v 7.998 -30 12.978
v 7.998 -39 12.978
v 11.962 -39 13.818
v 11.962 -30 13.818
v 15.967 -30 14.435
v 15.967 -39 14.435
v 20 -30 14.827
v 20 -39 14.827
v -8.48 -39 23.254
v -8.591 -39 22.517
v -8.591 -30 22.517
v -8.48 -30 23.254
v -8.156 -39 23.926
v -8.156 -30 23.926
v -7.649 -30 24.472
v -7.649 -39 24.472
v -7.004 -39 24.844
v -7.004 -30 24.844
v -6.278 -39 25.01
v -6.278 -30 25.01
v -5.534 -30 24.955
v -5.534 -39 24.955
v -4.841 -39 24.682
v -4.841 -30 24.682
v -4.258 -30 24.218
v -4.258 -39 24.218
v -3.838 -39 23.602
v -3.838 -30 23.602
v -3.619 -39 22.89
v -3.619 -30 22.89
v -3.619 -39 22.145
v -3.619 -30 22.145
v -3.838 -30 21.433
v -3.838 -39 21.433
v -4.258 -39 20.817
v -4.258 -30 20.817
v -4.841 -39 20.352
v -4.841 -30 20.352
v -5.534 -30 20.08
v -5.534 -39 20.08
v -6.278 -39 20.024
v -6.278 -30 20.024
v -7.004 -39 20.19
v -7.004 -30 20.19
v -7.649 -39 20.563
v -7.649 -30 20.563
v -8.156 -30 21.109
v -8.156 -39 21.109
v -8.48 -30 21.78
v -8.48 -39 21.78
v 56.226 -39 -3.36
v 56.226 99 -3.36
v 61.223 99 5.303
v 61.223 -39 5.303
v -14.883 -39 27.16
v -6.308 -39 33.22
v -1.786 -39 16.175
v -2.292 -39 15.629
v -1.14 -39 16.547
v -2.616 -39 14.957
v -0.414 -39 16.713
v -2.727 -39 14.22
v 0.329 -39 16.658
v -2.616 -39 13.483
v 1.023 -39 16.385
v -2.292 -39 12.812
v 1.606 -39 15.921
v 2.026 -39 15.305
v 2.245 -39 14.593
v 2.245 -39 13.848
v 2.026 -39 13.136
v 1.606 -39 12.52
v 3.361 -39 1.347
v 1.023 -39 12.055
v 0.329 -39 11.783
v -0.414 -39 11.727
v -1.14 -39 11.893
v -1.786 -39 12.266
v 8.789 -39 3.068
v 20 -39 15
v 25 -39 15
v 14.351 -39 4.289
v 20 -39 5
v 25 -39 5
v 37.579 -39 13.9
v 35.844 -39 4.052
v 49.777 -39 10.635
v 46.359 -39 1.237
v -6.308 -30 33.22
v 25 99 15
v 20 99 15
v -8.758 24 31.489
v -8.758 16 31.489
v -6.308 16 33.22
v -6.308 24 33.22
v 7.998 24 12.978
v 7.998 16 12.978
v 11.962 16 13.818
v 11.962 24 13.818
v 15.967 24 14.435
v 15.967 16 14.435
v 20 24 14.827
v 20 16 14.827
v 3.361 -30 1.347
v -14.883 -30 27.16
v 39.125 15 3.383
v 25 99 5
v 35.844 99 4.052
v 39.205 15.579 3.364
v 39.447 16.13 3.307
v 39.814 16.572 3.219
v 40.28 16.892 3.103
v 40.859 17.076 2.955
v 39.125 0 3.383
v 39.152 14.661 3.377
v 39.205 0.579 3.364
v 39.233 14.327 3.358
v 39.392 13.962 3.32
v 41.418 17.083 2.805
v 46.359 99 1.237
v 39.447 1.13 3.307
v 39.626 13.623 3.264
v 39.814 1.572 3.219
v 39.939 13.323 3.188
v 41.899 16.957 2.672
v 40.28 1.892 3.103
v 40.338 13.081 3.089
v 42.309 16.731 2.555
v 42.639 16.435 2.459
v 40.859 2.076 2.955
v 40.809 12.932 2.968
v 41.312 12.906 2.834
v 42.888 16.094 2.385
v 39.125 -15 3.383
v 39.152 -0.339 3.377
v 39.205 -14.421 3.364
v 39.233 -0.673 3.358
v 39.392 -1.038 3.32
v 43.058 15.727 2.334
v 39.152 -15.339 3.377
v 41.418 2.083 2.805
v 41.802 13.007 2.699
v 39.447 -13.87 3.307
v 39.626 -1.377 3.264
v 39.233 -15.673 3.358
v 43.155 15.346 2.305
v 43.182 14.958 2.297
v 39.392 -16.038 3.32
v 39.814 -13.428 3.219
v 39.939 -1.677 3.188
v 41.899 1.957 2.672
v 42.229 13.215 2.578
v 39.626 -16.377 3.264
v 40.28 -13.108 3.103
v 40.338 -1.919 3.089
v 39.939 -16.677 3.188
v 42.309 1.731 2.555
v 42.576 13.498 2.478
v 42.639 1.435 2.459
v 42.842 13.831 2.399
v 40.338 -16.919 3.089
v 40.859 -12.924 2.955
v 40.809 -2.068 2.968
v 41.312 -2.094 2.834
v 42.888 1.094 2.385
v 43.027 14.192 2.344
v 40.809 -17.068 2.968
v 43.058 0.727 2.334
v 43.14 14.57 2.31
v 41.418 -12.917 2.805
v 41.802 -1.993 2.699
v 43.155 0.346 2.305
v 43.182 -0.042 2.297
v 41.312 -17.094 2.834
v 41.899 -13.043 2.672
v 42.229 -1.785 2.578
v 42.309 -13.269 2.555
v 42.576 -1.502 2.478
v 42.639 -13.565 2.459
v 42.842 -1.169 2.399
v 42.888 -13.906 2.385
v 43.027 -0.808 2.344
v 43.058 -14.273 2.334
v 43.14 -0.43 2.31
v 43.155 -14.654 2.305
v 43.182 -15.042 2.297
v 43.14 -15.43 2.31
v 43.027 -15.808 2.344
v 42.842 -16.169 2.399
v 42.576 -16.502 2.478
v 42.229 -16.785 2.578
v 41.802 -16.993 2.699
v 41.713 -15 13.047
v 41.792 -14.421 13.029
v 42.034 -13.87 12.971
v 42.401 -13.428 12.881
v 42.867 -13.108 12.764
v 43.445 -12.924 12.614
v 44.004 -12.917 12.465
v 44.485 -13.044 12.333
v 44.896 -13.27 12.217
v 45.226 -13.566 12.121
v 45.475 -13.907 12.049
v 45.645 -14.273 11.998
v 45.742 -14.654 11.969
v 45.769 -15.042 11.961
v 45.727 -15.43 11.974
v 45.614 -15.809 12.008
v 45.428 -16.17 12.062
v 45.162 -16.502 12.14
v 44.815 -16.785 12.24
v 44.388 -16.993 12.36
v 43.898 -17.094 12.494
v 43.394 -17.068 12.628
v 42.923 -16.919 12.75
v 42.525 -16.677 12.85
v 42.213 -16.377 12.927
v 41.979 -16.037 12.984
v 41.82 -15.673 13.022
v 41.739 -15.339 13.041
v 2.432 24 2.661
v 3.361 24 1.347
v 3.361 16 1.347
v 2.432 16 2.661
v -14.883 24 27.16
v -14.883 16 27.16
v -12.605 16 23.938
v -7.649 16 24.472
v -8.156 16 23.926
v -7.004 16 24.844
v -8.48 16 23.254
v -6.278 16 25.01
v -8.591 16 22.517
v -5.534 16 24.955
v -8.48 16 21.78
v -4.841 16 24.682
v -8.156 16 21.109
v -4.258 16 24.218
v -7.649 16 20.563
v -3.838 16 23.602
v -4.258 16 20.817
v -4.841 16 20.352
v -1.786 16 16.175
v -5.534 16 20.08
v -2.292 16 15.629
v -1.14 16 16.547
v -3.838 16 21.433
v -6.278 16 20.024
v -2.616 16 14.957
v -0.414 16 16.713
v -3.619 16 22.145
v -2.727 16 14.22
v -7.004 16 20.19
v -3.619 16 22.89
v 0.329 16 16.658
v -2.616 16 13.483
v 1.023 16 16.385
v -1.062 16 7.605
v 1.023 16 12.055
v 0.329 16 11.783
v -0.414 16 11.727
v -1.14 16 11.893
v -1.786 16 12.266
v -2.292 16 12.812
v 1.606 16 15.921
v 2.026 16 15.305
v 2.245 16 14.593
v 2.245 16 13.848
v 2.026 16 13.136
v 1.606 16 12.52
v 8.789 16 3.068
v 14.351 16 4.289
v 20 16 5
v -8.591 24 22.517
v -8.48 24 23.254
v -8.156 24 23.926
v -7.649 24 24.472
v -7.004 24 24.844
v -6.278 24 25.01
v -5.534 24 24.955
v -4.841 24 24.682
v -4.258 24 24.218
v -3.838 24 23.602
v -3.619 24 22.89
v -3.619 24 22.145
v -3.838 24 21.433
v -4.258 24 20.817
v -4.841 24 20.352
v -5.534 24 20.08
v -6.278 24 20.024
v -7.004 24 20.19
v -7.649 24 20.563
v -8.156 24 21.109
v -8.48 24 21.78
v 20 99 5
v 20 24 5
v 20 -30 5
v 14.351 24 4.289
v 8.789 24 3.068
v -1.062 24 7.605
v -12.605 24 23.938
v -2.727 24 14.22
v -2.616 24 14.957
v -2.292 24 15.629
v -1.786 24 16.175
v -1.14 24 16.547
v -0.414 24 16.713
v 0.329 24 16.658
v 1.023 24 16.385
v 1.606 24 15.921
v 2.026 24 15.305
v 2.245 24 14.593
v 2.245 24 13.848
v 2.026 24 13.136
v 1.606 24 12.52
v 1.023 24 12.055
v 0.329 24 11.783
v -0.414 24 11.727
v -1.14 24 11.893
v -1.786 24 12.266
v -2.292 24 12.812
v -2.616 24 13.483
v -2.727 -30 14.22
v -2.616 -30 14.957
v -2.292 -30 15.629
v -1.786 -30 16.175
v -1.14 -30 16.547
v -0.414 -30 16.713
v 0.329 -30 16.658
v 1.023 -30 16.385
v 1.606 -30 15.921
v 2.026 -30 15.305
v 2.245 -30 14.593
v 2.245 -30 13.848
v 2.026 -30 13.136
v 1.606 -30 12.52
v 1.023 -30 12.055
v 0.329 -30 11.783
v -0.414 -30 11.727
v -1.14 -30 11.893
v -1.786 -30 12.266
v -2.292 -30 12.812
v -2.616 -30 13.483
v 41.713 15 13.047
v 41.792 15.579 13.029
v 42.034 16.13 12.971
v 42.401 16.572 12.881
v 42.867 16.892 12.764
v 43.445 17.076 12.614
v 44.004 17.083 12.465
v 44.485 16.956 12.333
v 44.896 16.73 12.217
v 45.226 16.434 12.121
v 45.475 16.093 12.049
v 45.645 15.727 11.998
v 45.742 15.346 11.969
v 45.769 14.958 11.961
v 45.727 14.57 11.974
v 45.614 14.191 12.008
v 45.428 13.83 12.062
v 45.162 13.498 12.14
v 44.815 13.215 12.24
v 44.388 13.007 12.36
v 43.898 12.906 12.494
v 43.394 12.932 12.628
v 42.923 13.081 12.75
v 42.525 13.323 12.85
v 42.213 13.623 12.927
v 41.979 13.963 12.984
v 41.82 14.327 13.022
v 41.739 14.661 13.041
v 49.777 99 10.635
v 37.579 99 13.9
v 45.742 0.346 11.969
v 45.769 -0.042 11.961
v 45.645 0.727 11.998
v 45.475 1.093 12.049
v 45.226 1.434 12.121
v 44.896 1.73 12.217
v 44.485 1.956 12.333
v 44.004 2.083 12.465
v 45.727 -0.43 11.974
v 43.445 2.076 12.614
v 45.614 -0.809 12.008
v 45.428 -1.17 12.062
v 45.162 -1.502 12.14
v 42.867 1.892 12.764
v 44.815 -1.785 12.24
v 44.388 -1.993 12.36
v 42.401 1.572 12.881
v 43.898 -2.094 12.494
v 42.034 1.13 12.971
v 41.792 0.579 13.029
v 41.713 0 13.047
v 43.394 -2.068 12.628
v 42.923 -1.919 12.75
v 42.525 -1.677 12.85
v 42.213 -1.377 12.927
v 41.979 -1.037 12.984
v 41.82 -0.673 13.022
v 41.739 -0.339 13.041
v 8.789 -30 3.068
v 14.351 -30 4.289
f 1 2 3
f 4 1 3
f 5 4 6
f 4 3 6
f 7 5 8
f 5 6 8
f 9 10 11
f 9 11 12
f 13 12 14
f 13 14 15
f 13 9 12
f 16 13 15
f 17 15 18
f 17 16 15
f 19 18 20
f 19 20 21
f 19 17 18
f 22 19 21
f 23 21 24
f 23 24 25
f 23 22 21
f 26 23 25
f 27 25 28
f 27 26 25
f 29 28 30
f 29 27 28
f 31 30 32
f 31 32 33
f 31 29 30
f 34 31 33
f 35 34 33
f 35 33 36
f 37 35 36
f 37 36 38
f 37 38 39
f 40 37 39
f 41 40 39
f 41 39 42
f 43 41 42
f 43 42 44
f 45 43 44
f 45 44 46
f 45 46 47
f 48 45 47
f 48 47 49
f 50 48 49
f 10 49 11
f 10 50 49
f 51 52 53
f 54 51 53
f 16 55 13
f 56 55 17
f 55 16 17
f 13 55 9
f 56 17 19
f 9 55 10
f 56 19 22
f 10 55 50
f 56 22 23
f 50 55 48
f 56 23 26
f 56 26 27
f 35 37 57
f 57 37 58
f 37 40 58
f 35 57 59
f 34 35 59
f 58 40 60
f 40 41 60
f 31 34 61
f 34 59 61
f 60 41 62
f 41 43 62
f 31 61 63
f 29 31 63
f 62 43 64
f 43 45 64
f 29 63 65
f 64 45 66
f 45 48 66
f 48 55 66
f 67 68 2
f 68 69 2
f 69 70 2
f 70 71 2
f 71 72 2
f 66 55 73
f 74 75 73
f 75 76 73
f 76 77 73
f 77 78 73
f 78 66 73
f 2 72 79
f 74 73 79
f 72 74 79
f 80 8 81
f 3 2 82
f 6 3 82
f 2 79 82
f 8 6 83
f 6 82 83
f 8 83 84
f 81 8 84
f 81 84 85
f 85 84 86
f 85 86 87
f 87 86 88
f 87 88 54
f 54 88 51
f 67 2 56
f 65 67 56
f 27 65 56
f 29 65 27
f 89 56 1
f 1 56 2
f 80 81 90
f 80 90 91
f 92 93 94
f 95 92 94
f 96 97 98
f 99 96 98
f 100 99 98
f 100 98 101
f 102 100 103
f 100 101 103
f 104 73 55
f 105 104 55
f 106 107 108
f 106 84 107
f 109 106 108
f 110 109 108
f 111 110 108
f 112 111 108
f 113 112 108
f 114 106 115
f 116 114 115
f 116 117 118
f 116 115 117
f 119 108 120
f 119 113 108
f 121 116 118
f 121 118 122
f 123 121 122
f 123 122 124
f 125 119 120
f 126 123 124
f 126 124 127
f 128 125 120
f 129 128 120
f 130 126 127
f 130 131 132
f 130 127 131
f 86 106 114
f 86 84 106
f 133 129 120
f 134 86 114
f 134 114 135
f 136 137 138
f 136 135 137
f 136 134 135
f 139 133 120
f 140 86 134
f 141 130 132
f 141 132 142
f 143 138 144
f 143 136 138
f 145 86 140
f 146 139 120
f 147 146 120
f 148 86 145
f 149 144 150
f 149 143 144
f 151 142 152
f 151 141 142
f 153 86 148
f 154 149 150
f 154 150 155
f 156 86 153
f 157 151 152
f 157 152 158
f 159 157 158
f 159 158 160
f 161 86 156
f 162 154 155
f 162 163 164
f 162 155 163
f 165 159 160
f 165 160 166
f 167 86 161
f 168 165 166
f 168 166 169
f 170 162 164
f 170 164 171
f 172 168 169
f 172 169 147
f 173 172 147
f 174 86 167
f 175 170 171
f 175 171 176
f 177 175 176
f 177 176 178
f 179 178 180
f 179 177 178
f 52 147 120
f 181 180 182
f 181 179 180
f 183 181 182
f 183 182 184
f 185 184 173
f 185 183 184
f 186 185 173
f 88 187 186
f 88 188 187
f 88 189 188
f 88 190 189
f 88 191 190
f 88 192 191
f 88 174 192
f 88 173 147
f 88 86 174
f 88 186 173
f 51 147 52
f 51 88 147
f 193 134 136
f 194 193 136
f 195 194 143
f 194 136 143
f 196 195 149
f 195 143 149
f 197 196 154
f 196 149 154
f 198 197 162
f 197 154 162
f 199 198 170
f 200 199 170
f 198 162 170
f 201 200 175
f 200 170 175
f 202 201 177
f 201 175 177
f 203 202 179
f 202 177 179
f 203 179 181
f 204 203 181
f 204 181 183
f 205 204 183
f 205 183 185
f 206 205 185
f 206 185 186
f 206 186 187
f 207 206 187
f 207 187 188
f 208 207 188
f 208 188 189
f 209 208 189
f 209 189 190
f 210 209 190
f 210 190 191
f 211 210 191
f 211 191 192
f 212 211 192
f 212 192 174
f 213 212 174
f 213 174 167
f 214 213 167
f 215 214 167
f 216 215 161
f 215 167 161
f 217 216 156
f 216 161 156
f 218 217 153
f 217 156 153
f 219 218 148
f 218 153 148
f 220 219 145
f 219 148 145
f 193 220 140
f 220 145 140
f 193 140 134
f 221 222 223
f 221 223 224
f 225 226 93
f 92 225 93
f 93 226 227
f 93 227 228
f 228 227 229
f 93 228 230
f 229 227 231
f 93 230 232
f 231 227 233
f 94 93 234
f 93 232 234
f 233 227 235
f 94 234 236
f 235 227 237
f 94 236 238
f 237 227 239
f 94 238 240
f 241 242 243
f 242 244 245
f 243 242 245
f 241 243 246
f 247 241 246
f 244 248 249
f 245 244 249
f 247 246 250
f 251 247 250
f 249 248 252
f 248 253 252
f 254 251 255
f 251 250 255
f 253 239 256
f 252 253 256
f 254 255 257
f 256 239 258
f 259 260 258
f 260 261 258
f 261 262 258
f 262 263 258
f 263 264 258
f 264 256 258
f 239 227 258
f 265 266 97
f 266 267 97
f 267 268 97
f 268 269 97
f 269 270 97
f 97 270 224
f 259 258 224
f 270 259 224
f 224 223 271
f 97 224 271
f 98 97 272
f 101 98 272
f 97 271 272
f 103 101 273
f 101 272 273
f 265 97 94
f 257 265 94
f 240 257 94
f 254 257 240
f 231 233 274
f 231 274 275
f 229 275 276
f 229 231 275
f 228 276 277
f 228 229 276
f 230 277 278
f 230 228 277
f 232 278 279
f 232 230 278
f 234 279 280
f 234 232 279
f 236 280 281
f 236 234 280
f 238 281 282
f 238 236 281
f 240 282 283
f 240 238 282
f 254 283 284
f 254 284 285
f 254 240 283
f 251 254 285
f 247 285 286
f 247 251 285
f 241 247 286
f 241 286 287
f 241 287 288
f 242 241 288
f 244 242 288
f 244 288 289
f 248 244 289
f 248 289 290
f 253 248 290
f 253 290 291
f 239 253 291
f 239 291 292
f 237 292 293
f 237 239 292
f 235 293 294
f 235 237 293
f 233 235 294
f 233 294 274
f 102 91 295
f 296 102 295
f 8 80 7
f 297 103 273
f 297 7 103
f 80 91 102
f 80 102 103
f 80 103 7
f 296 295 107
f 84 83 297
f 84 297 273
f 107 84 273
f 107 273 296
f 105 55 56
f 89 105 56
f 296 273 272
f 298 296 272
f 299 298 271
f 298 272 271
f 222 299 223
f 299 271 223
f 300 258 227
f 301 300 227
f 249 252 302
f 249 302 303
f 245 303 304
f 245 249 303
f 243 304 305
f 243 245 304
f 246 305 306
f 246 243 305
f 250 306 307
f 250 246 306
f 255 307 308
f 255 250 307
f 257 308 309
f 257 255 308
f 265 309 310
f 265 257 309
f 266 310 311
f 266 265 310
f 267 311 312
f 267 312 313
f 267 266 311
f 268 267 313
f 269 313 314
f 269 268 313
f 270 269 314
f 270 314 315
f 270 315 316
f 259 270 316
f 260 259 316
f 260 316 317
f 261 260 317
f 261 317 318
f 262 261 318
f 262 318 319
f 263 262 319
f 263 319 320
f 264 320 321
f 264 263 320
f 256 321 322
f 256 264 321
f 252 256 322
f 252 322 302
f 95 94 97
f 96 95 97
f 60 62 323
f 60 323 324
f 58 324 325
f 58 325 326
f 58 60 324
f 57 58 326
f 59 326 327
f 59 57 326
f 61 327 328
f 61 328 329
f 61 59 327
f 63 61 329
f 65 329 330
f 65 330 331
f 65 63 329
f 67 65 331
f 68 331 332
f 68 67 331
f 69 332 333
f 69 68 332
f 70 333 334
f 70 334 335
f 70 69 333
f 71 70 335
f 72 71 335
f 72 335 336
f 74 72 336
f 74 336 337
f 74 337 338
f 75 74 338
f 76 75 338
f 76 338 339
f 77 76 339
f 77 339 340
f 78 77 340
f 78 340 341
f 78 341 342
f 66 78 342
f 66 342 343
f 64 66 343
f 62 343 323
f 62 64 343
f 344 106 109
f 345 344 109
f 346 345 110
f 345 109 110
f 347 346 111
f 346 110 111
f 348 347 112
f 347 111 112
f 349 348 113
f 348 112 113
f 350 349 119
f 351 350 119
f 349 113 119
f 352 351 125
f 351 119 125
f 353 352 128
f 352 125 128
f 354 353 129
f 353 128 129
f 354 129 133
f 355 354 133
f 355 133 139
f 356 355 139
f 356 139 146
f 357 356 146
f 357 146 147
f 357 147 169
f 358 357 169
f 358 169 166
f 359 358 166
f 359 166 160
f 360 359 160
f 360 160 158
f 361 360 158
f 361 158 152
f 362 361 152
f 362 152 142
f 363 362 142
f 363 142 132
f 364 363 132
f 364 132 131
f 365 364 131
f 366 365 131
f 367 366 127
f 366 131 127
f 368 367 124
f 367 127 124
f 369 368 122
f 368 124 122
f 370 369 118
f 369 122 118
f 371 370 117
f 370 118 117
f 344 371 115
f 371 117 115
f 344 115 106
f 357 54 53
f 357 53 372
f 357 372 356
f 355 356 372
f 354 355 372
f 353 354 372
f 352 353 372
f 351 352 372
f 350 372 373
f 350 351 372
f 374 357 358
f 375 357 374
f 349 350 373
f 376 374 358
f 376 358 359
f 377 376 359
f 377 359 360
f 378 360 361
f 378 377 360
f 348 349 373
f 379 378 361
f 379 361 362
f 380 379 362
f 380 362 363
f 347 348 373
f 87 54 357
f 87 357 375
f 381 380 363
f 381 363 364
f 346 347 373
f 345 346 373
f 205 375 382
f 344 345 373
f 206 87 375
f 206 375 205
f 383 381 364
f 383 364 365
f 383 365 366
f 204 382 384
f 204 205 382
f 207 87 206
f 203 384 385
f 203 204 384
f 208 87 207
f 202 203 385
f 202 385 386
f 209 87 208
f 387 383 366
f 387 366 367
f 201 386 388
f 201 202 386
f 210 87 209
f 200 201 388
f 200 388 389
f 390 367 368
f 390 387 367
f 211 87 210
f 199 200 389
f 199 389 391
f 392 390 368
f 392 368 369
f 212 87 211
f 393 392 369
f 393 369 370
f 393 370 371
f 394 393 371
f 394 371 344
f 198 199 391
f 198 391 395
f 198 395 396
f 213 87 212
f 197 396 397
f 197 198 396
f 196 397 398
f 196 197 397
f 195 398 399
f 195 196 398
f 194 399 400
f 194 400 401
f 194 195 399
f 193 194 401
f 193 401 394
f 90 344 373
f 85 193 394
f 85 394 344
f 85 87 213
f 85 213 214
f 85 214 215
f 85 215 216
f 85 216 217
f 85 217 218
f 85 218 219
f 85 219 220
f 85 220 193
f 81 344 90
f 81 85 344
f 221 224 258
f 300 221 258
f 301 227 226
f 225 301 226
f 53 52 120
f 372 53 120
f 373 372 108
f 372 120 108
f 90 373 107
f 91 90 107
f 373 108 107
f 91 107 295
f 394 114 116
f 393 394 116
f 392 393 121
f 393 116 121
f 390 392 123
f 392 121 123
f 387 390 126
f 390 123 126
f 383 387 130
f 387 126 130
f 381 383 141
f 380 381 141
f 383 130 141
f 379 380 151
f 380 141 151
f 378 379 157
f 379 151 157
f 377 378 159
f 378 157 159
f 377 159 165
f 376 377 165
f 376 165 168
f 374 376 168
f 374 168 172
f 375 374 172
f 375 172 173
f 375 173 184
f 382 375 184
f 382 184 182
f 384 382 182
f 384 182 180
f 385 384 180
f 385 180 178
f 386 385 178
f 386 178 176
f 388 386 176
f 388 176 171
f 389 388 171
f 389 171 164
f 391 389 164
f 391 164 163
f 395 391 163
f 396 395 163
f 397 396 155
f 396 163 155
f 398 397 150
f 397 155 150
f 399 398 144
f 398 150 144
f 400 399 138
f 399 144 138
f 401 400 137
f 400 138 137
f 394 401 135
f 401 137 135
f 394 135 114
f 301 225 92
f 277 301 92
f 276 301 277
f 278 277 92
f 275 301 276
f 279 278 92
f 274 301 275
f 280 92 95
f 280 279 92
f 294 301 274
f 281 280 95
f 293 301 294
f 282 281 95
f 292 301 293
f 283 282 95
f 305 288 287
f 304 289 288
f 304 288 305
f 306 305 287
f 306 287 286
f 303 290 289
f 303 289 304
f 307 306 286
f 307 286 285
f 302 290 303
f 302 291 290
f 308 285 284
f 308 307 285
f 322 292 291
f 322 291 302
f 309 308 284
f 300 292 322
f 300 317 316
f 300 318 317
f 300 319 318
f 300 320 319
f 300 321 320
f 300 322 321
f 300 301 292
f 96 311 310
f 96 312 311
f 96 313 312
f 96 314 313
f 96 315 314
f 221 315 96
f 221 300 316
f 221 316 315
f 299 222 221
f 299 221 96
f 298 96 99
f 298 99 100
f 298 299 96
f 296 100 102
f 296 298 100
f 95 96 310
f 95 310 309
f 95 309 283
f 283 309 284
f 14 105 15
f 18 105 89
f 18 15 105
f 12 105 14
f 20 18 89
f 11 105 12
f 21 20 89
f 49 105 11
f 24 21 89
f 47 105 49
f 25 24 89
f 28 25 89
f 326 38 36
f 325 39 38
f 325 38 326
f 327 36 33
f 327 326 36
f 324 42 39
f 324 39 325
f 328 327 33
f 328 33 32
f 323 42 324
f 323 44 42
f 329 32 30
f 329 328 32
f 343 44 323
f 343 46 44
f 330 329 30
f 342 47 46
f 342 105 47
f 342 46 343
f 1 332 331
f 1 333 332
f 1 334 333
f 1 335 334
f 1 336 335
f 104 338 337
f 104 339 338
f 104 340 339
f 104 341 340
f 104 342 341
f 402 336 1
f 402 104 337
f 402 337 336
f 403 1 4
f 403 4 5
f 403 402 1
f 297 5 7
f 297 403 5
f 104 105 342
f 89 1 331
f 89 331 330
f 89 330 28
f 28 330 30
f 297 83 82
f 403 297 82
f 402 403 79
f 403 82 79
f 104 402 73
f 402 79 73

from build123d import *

# Parameters (mm, degrees)
BOSS_EXTRUDE2_DEPTH = 20
FILLET1_RADIUS      = 10
FILLET1_LENGTH      = 5
FILLET2_RADIUS      = 10
FILLET2_LENGTH      = 5
SKETCH5_R           = 1
SKETCH5_R_2         = 5.5
CUT_EXTRUDE5_DEPTH  = 69.007352544
CUT_EXTRUDE7_DEPTH  = 25
FILLET5_R           = 10
BOSS_EXTRUDE5_DEPTH = 60
SKETCH13_R          = 2.1
CUT_EXTRUDE8_DEPTH  = 60
CUT_EXTRUDE9_DEPTH  = 60
CUT_EXTRUDE10_DEPTH = 60
SKETCH17_R          = 2.5
BOSS_EXTRUDE6_DEPTH = 8
SKETCH18_R          = 2.5
BOSS_EXTRUDE7_DEPTH = 9
BOSS_EXTRUDE8_DEPTH = 69


with BuildPart() as part:
    # Sketch1 → Boss-Extrude2 (new body)
    with BuildSketch(Plane.XY):
        Polygon((-25, 30), (25, 30), (25, -30), (-25, -30), (-25, -25), (-20, -25), (20, -25), (20, 25), (-20, 25), (-25, 25), align=None)
    extrude(amount=BOSS_EXTRUDE2_DEPTH)

    # Fillet1: full round fillet: the end face becomes a half cylinder, R = half its width
    fillet1_face = Plane((-25, 27.5, 10), x_dir=(0, -1, 0), z_dir=(-1, 0, 0))  # on the end face: x along it, z out of the body
    fillet1_slab = fillet1_face.offset(-FILLET1_RADIUS / 2) * Box(FILLET1_LENGTH, 2 * FILLET1_RADIUS, FILLET1_RADIUS, mode=Mode.PRIVATE)  # the body's end, R deep
    fillet1_round = Plane((-15, 27.5, 10), x_dir=(-1, 0, 0), z_dir=(0, -1, 0)) * Cylinder(FILLET1_RADIUS, FILLET1_LENGTH, mode=Mode.PRIVATE)  # its axis R under the face
    add(fillet1_slab - fillet1_round, mode=Mode.SUBTRACT)

    # Fillet2: full round fillet: the end face becomes a half cylinder, R = half its width
    fillet2_face = Plane((-25, -27.5, 10), x_dir=(0, -1, 0), z_dir=(-1, 0, 0))  # on the end face: x along it, z out of the body
    fillet2_slab = fillet2_face.offset(-FILLET2_RADIUS / 2) * Box(FILLET2_LENGTH, 2 * FILLET2_RADIUS, FILLET2_RADIUS, mode=Mode.PRIVATE)  # the body's end, R deep
    fillet2_round = Plane((-15, -27.5, 10), x_dir=(-1, 0, 0), z_dir=(0, -1, 0)) * Cylinder(FILLET2_RADIUS, FILLET2_LENGTH, mode=Mode.PRIVATE)  # its axis R under the face
    add(fillet2_slab - fillet2_round, mode=Mode.SUBTRACT)

    # Sketch5 → Cut-Extrude5 (cut, through all)
    with BuildSketch(Plane(origin=(0, 30, 0), x_dir=(1, 0, 0), z_dir=(0, 1, 0))):
        with Locations(Location((-15, -3, 0), (0, 0, 180))):
            Circle(SKETCH5_R)
        with Locations(Location((-22, -10, 0), (0, 0, 180))):
            Circle(SKETCH5_R)
        with Locations(Location((-15, -17, 0), (0, 0, 180))):
            Circle(SKETCH5_R)
        with Locations(Location((-8, -10, 0), (0, 0, 180))):
            Circle(SKETCH5_R)
        with Locations(Location((-15, -10, 0), (0, 0, 180))):
            Circle(SKETCH5_R_2)
    extrude(amount=-CUT_EXTRUDE5_DEPTH, mode=Mode.SUBTRACT)

    # Sketch10 → Cut-Extrude7 (cut)
    with BuildSketch(Plane(origin=(25, 0, 0), x_dir=(0, 0, -1), z_dir=(1, 0, 0))):
        Polygon((-15, 28.180148829), (-15, -28.180148829), (-15, -30), (-20, -30), (-20, 30), (-15, 30), align=None)
        Polygon((-5, 28.180148829), (-5, -28.180148829), (-5, -30), (0, -30), (0, 30), (-5, 30), align=None)
    extrude(amount=-CUT_EXTRUDE7_DEPTH, mode=Mode.SUBTRACT)

    # Fillet5
    # the kernel refuses this fillet: 10 mm, written as the material it adds along each edge
    with BuildSketch(Plane(origin=(0, 25, 15), x_dir=(1, 0, 0), z_dir=(0, 1, 0)), Plane(origin=(0, -30, 15), x_dir=(1, 0, 0), z_dir=(0, 1, 0)), Plane(origin=(0, -25, 5), x_dir=(1, 0, 0), z_dir=(0, -1, 0))) as fillet5_piece_1:
        with BuildLine():
            CenterArc((8.660254038, -10), FILLET5_R, 90, 60)
            Line((0, -5), (-0.173205081, -4.9))
            ThreePointArc((-0.173205081, -4.9), (-0.2, -2.5), (-0.2, 0))
            Line((-0.2, 0), (0, 0.2))
            Line((0, 0.2), (8.660254038, 0.2))
            Line((8.660254038, 0.2), (8.660254038, 0))
        make_face()
    extrude(amount=5)
    with BuildSketch(Plane(origin=(0, 30, 5), x_dir=(0, 0, -1), z_dir=(0, -1, 0))) as fillet5_piece_2:
        with BuildLine():
            CenterArc((10, 8.660254038), FILLET5_R, 180, 60)
            Line((0, 8.660254038), (-0.2, 8.660254038))
            Line((-0.2, 8.660254038), (-0.2, 0))
            Line((-0.2, 0), (0, -0.2))
            ThreePointArc((0, -0.2), (2.5, -0.2), (4.9, -0.173205081))
            Line((4.9, -0.173205081), (5, 0))
        make_face()
    extrude(amount=5)

    # Sketch12 → Boss-Extrude5 (add)
    with BuildSketch(Plane.XZ.offset(30)):
        with BuildLine():
            Line((56.226298398, -3.359735054), (61.222506141, 5.302707337))
            ThreePointArc((61.222506141, 5.302707337), (43.74904955, 12.533728595), (25, 15))
            Line((25, 15), (25, 5))
            ThreePointArc((25, 5), (41.16297375, 2.873903962), (56.226298398, -3.359735054))
        make_face()
    extrude(amount=-BOSS_EXTRUDE5_DEPTH)

    # Sketch13 → Cut-Extrude8 (cut)
    with BuildSketch(Plane(origin=(2.920998947, 0, 10.910870277), x_dir=(-0.9659824633840055, 0, 0.2586075800021504), z_dir=(-0.2586075800021504, 0, -0.9659824633840055))):
        with Locations((-39.019497435, 15)):
            Circle(SKETCH13_R)
        with Locations((-39.019497435, 0)):
            Circle(SKETCH13_R)
        with Locations((-39.019497435, -15)):
            Circle(SKETCH13_R)
    extrude(amount=-CUT_EXTRUDE8_DEPTH, mode=Mode.SUBTRACT)

    # Sketch15 → Cut-Extrude9 (cut)
    with BuildSketch(Plane(origin=(0, 30, 0), x_dir=(1, 0, 0), z_dir=(0, 1, 0))):
        with BuildLine():
            Line((8.660254038, -5), (8.660254038, -15))
            ThreePointArc((8.660254038, -15), (-39.182795974, -10), (8.660254038, -5))
        make_face()
    extrude(amount=-CUT_EXTRUDE9_DEPTH, mode=Mode.SUBTRACT)

    # Sketch16 → Cut-Extrude10 (cut)
    with BuildSketch(Plane(origin=(0, 30, 0), x_dir=(1, 0, 0), z_dir=(0, 1, 0))):
        Polygon((-6.307906019, -33.220384693), (8.660254038, -15), (20.000254038, -15), (20.000254038, -5), (8.660254038, -5), (3.496355525, -1.350438774), (-14.790578774, -27.225295226), align=None)
    extrude(amount=-CUT_EXTRUDE10_DEPTH, mode=Mode.SUBTRACT)

    # Sketch17 → Boss-Extrude6 (add)
    # profile 1 of 2: a face of its own
    with BuildSketch(Plane(origin=(0, 16, 0), x_dir=(1, 0, 0), z_dir=(0, 1, 0))):
        Polygon((2.432023453, -2.661202229), (-1.062108246, -7.605177784), (-12.605177784, -23.937891754), (-14.882580853, -27.160273185), (-8.757813114, -31.488924262), (-6.307906019, -33.220384693), (7.998117102, -12.978265997), (11.006698288, -8.721313737), align=None)
        with Locations(Location((-6.090722034, -22.517234763, 0), (0, 0, 180))):
            Circle(SKETCH17_R, mode=Mode.SUBTRACT)
        with Locations(Location((-0.226842709, -14.220216066, 0), (0, 0, 180))):
            Circle(SKETCH17_R, mode=Mode.SUBTRACT)
    # profile 2 of 2: a face of its own
    with BuildSketch(Plane(origin=(0, 16, 0), x_dir=(1, 0, 0), z_dir=(0, 1, 0))):
        with BuildLine():
            Line((3.360713643, -1.347164296), (2.432023453, -2.661202229))
            Line((2.432023453, -2.661202229), (11.006698288, -8.721313737))
            Line((11.006698288, -8.721313737), (7.998117102, -12.978265997))
            ThreePointArc((7.998117102, -12.978265997), (13.960401245, -14.154569005), (20.000254038, -14.827398269))
            Line((20.000254038, -14.827398269), (20.000254038, -5))
            ThreePointArc((20.000254038, -5), (11.555844657, -3.741343444), (3.360713643, -1.347164296))
        make_face()
    extrude(amount=BOSS_EXTRUDE6_DEPTH)

    # Sketch18 → Boss-Extrude7 (add)
    with BuildSketch(Plane(origin=(0, -39, 0), x_dir=(1, 0, 0), z_dir=(0, 1, 0))):
        with BuildLine():
            Line((3.360713643, -1.347164296), (-14.882580853, -27.160273185))
            Line((-14.882580853, -27.160273185), (-6.307906019, -33.220384693))
            Line((-6.307906019, -33.220384693), (7.998117102, -12.978265997))
            ThreePointArc((7.998117102, -12.978265997), (13.960401245, -14.154569005), (20.000254038, -14.827398269))
            Line((20.000254038, -14.827398269), (20.000254038, -15))
            Line((20.000254038, -15), (25, -15))
            ThreePointArc((25, -15), (43.74904955, -12.533728595), (61.222506141, -5.302707337))
            Line((61.222506141, -5.302707337), (56.226298398, 3.359735054))
            ThreePointArc((56.226298398, 3.359735054), (41.16297375, -2.873903962), (25, -5))
            Line((25, -5), (20.000254038, -5))
            ThreePointArc((20.000254038, -5), (11.555844657, -3.741343444), (3.360713643, -1.347164296))
        make_face()
        with Locations(Location((-6.090722034, -22.517234763, 0), (0, 0, 180))):
            Circle(SKETCH18_R, mode=Mode.SUBTRACT)
        with Locations(Location((-0.226842709, -14.220216066, 0), (0, 0, 180))):
            Circle(SKETCH18_R, mode=Mode.SUBTRACT)
    extrude(amount=BOSS_EXTRUDE7_DEPTH)

    # Sketch19 → Boss-Extrude8 (add)
    with BuildSketch(Plane(origin=(0, 30, 0), x_dir=(1, 0, 0), z_dir=(0, 1, 0))):
        with BuildLine():
            Line((56.226298398, 3.359735054), (61.222506141, -5.302707337))
            ThreePointArc((61.222506141, -5.302707337), (43.74904955, -12.533728595), (25, -15))
            Line((25, -15), (20.000254038, -15))
            Line((20.000254038, -15), (20.000254038, -5))
            Line((20.000254038, -5), (25, -5))
            ThreePointArc((25, -5), (41.16297375, -2.873903962), (56.226298398, 3.359735054))
        make_face()
    extrude(amount=BOSS_EXTRUDE8_DEPTH)


solid = part.part
